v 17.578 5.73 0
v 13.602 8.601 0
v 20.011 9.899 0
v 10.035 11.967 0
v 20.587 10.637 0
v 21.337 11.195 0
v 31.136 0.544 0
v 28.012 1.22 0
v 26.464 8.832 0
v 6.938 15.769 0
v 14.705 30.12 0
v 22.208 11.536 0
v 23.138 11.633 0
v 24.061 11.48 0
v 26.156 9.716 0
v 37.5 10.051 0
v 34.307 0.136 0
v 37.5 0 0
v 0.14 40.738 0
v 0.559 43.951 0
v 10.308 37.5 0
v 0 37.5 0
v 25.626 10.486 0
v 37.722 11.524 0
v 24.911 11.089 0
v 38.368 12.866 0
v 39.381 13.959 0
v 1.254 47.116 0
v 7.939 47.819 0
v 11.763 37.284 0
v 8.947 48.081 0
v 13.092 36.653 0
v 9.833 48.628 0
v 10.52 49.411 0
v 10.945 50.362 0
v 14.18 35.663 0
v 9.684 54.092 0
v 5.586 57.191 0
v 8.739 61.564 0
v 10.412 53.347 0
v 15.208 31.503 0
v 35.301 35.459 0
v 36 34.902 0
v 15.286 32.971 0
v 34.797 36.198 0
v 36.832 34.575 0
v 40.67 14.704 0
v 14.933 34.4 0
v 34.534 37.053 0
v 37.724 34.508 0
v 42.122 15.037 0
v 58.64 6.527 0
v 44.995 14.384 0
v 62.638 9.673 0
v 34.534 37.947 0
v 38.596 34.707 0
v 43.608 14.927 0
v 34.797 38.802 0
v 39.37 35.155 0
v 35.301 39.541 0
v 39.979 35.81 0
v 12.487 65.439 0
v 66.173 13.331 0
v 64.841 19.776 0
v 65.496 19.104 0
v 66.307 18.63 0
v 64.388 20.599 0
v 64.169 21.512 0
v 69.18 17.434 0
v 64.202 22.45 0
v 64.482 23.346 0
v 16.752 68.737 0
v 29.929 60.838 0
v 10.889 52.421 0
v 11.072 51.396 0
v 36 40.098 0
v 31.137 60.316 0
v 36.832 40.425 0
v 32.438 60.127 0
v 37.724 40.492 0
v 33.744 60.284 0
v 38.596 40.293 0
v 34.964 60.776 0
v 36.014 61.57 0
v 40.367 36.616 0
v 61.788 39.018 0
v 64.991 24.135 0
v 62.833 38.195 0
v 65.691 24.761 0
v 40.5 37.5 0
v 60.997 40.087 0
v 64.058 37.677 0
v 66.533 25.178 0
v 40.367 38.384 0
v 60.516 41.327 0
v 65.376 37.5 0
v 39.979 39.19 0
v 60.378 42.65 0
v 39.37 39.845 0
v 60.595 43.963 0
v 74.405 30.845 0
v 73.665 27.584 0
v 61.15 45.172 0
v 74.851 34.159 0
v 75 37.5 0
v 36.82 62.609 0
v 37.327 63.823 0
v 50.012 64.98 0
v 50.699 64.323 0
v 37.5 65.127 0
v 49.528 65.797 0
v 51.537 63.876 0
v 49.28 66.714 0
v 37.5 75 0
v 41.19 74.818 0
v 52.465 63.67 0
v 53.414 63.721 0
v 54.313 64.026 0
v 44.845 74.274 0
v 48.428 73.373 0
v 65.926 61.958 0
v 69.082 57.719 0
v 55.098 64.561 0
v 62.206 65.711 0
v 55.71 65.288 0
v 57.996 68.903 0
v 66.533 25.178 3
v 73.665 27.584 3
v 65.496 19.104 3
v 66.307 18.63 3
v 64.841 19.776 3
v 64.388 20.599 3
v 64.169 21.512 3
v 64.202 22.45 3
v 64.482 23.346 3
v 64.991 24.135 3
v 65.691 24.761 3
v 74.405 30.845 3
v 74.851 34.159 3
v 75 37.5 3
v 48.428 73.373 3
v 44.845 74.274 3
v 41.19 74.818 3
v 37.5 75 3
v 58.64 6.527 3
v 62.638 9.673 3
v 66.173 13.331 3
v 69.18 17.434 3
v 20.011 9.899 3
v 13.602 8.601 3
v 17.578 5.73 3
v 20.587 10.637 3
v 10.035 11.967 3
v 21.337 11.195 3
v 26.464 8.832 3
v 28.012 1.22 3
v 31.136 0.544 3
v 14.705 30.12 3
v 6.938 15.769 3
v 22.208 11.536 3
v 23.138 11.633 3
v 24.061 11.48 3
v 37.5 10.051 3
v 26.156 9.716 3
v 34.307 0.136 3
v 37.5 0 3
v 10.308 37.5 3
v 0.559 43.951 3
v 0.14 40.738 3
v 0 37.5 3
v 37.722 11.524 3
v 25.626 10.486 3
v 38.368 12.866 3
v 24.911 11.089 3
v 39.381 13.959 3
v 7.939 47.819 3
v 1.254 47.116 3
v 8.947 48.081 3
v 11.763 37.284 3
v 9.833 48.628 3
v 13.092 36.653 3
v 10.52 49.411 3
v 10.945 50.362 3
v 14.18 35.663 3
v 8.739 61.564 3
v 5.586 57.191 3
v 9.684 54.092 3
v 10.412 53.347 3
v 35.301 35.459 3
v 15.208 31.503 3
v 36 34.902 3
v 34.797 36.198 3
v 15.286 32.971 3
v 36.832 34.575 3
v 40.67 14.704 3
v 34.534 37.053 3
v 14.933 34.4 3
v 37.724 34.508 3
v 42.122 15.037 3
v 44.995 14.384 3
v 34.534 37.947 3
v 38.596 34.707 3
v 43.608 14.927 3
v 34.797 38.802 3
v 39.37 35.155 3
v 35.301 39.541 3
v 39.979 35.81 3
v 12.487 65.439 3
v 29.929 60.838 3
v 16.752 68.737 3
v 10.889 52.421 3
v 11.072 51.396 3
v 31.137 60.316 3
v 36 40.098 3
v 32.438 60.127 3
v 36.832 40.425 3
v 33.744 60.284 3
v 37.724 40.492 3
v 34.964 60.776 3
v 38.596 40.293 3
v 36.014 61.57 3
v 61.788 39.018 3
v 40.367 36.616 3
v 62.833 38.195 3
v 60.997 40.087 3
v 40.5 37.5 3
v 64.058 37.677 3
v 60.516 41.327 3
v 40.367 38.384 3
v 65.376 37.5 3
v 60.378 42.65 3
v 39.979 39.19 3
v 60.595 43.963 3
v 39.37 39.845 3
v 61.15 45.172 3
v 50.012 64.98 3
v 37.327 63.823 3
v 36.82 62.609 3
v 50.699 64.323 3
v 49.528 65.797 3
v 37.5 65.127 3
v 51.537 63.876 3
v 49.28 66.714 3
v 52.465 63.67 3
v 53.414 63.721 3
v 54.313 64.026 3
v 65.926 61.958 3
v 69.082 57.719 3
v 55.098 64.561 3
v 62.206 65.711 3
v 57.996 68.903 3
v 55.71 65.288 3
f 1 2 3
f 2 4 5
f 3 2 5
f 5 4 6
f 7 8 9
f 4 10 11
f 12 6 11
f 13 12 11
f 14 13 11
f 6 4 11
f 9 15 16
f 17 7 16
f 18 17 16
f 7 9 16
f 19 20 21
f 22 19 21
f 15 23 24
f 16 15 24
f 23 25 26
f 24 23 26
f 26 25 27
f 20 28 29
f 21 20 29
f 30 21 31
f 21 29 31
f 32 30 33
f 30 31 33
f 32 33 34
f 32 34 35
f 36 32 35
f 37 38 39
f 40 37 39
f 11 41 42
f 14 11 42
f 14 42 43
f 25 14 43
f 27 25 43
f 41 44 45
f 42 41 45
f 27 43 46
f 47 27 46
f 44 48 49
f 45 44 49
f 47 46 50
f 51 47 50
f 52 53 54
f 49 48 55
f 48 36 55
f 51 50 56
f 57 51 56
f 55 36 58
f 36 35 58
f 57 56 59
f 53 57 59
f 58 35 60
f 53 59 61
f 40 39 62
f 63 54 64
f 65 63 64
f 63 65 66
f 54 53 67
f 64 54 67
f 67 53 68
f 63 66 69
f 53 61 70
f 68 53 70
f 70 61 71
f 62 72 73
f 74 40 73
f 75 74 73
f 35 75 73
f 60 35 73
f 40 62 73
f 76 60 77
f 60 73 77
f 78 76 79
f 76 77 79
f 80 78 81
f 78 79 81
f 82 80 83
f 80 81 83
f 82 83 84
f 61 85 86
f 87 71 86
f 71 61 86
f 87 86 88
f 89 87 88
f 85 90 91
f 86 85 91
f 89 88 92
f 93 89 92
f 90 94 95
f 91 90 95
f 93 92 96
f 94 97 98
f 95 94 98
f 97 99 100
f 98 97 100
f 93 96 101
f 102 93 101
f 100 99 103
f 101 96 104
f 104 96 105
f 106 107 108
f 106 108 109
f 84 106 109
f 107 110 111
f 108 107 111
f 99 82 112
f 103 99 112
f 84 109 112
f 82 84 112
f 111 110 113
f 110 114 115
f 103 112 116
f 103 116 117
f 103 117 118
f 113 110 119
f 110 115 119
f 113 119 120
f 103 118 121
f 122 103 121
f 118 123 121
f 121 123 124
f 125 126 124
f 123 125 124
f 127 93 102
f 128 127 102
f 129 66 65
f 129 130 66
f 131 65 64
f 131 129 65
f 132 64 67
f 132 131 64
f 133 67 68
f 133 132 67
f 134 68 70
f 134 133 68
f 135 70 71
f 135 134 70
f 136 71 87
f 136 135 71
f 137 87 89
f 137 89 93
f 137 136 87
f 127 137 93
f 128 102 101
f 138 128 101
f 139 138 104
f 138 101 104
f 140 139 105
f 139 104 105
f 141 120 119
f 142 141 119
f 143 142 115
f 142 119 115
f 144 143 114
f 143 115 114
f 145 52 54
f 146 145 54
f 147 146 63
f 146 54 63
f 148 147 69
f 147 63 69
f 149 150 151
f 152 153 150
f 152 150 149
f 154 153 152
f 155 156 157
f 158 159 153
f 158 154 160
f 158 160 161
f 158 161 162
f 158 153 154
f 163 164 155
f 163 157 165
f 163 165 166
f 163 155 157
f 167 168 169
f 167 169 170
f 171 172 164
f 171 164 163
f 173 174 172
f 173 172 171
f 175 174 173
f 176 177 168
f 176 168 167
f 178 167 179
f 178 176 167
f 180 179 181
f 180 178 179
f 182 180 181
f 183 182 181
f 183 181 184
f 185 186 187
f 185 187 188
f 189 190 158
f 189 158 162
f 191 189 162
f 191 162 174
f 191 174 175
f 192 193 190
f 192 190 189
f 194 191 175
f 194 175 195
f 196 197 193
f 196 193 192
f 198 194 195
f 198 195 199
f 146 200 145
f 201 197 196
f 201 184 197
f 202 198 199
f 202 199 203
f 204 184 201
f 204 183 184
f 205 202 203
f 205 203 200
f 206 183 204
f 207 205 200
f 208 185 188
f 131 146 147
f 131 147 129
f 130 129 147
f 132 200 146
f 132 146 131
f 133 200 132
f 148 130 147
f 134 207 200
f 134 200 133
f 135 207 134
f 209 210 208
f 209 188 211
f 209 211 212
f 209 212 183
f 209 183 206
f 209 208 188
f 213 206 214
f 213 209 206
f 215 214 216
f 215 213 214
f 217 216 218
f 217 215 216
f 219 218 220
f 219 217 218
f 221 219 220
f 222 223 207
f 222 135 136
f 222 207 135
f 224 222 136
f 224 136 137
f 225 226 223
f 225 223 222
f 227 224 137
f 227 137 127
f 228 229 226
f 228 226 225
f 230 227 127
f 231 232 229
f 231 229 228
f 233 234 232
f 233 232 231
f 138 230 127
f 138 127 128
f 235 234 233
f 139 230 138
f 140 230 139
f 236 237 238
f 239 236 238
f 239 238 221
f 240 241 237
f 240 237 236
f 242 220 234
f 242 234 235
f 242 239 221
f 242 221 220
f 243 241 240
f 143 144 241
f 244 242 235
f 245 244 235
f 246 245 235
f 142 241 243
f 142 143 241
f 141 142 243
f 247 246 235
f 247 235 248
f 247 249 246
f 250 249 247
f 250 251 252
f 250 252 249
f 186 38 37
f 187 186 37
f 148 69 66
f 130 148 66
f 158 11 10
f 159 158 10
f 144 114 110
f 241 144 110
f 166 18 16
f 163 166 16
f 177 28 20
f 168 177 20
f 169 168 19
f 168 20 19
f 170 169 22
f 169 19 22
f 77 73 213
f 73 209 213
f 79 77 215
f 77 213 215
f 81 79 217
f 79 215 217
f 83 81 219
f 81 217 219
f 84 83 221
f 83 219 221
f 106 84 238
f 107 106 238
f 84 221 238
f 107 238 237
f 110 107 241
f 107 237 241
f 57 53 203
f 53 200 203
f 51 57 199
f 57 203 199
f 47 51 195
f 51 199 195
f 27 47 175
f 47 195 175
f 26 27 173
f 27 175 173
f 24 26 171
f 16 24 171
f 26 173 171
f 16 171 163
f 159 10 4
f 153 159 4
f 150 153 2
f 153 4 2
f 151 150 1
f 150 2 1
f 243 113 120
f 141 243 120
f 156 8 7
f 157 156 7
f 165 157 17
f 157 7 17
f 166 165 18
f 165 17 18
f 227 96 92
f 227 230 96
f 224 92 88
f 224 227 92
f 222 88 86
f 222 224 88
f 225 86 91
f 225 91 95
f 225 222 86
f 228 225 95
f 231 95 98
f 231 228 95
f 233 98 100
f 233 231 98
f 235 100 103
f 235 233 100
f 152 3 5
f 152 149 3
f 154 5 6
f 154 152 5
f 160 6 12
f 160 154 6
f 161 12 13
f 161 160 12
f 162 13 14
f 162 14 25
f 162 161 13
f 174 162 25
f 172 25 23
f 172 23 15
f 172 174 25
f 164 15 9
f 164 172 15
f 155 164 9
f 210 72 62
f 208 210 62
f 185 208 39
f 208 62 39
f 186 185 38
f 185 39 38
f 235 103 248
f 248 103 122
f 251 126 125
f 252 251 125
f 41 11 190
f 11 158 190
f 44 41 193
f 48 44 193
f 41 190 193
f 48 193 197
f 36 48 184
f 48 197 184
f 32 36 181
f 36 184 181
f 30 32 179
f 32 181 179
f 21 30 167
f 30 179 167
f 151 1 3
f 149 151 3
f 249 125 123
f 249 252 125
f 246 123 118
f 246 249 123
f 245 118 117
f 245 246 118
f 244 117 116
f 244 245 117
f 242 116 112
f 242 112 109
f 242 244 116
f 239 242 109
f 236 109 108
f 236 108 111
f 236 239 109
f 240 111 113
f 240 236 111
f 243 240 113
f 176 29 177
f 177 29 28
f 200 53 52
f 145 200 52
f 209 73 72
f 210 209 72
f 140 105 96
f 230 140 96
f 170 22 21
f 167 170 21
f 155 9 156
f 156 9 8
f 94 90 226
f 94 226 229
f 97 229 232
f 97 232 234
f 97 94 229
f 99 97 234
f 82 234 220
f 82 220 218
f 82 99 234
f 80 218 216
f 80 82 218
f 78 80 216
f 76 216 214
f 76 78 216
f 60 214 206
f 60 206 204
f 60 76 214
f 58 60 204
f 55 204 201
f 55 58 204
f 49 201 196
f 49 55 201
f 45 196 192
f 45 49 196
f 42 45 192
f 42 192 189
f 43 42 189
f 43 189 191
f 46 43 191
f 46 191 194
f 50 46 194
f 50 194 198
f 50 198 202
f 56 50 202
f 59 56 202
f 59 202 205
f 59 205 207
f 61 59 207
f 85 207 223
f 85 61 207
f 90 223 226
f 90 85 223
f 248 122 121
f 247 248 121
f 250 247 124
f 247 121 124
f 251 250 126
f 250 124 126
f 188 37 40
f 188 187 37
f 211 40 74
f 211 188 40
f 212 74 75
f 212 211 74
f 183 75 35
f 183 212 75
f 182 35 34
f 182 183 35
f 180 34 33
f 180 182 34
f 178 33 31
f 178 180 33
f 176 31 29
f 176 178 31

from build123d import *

# Parameters (mm, degrees)
F0_R     = 3
F1_DEPTH = 3
F2_R     = 5
F3_R     = 5
F4_R     = 5
F5_R     = 5
F6_R     = 3.5
F7_R     = 3.5
F8_R     = 3.5
F9_R     = 3.5


with BuildPart() as f1:
    # F0 (on Top) → F1 (new body)
    with BuildSketch(Plane.XY):
        with BuildLine():
            ThreePointArc((73.665267, 27.584182), (74.664819, 32.497377), (75, 37.5))
            Line((75, 37.5), (56.3, 37.5))
            Line((56.3, 37.5), (69.082022, 57.719443))
            ThreePointArc((69.082022, 57.719443), (64.132536, 63.899962), (57.995666, 68.903466))
            Line((57.995666, 68.903466), (50.514808, 57.069753))
            Line((50.514808, 57.069753), (48.427588, 73.372522))
            ThreePointArc((48.427588, 73.372522), (43.024058, 74.590899), (37.5, 75))
            Line((37.5, 75), (37.5, 56.3))
            Line((37.5, 56.3), (16.751921, 68.737273))
            ThreePointArc((16.751921, 68.737273), (10.54359, 63.569176), (5.586086, 57.191421))
            Line((5.586086, 57.191421), (16.751921, 48.74606))
            Line((16.751921, 48.74606), (1.253953, 47.116346))
            ThreePointArc((1.253953, 47.116346), (0.31481, 42.348879), (0, 37.5))
            Line((0, 37.5), (18.7, 37.5))
            Line((18.7, 37.5), (6.938024, 15.769478))
            ThreePointArc((6.938024, 15.769478), (11.763487, 10.225802), (17.577552, 5.729793))
            Line((17.577552, 5.729793), (24.635362, 17.820587))
            Line((24.635362, 17.820587), (28.01219, 1.220096))
            ThreePointArc((28.01219, 1.220096), (32.717031, 0.306275), (37.5, 0))
            Line((37.5, 0), (37.5, 18.7))
            Line((37.5, 18.7), (58.640158, 6.526726))
            ThreePointArc((58.640158, 6.526726), (64.467307, 11.442096), (69.179969, 17.434369))
            Line((69.179969, 17.434369), (57.719454, 22.204241))
            Line((57.719454, 22.204241), (73.665267, 27.584182))
        make_face()
        with Locations((37.5, 37.5)):
            Circle(F0_R, mode=Mode.SUBTRACT)
    extrude(amount=F1_DEPTH)

    # F2
    f2_edges = [f1.edges().sort_by_distance(p)[0] for p in [
        (37.5, 18.7, 1.5),
    ]]
    fillet(f2_edges, radius=F2_R)

    # F3
    f3_edges = [f1.edges().sort_by_distance(p)[0] for p in [
        (56.3, 37.5, 1.5),
    ]]
    fillet(f3_edges, radius=F3_R)

    # F4
    f4_edges = [f1.edges().sort_by_distance(p)[0] for p in [
        (18.7, 37.5, 1.5),
    ]]
    fillet(f4_edges, radius=F4_R)

    # F5
    f5_edges = [f1.edges().sort_by_distance(p)[0] for p in [
        (37.5, 56.3, 1.5),
    ]]
    fillet(f5_edges, radius=F5_R)

    # F6
    f6_edges = [f1.edges().sort_by_distance(p)[0] for p in [
        (24.635362, 17.820587, 1.5),
    ]]
    fillet(f6_edges, radius=F6_R)

    # F7
    f7_edges = [f1.edges().sort_by_distance(p)[0] for p in [
        (57.719454, 22.204241, 1.5),
    ]]
    fillet(f7_edges, radius=F7_R)

    # F8
    f8_edges = [f1.edges().sort_by_distance(p)[0] for p in [
        (50.514808, 57.069753, 1.5),
    ]]
    fillet(f8_edges, radius=F8_R)

    # F9
    f9_edges = [f1.edges().sort_by_distance(p)[0] for p in [
        (16.751921, 48.74606, 1.5),
    ]]
    fillet(f9_edges, radius=F9_R)


solid = f1.part
